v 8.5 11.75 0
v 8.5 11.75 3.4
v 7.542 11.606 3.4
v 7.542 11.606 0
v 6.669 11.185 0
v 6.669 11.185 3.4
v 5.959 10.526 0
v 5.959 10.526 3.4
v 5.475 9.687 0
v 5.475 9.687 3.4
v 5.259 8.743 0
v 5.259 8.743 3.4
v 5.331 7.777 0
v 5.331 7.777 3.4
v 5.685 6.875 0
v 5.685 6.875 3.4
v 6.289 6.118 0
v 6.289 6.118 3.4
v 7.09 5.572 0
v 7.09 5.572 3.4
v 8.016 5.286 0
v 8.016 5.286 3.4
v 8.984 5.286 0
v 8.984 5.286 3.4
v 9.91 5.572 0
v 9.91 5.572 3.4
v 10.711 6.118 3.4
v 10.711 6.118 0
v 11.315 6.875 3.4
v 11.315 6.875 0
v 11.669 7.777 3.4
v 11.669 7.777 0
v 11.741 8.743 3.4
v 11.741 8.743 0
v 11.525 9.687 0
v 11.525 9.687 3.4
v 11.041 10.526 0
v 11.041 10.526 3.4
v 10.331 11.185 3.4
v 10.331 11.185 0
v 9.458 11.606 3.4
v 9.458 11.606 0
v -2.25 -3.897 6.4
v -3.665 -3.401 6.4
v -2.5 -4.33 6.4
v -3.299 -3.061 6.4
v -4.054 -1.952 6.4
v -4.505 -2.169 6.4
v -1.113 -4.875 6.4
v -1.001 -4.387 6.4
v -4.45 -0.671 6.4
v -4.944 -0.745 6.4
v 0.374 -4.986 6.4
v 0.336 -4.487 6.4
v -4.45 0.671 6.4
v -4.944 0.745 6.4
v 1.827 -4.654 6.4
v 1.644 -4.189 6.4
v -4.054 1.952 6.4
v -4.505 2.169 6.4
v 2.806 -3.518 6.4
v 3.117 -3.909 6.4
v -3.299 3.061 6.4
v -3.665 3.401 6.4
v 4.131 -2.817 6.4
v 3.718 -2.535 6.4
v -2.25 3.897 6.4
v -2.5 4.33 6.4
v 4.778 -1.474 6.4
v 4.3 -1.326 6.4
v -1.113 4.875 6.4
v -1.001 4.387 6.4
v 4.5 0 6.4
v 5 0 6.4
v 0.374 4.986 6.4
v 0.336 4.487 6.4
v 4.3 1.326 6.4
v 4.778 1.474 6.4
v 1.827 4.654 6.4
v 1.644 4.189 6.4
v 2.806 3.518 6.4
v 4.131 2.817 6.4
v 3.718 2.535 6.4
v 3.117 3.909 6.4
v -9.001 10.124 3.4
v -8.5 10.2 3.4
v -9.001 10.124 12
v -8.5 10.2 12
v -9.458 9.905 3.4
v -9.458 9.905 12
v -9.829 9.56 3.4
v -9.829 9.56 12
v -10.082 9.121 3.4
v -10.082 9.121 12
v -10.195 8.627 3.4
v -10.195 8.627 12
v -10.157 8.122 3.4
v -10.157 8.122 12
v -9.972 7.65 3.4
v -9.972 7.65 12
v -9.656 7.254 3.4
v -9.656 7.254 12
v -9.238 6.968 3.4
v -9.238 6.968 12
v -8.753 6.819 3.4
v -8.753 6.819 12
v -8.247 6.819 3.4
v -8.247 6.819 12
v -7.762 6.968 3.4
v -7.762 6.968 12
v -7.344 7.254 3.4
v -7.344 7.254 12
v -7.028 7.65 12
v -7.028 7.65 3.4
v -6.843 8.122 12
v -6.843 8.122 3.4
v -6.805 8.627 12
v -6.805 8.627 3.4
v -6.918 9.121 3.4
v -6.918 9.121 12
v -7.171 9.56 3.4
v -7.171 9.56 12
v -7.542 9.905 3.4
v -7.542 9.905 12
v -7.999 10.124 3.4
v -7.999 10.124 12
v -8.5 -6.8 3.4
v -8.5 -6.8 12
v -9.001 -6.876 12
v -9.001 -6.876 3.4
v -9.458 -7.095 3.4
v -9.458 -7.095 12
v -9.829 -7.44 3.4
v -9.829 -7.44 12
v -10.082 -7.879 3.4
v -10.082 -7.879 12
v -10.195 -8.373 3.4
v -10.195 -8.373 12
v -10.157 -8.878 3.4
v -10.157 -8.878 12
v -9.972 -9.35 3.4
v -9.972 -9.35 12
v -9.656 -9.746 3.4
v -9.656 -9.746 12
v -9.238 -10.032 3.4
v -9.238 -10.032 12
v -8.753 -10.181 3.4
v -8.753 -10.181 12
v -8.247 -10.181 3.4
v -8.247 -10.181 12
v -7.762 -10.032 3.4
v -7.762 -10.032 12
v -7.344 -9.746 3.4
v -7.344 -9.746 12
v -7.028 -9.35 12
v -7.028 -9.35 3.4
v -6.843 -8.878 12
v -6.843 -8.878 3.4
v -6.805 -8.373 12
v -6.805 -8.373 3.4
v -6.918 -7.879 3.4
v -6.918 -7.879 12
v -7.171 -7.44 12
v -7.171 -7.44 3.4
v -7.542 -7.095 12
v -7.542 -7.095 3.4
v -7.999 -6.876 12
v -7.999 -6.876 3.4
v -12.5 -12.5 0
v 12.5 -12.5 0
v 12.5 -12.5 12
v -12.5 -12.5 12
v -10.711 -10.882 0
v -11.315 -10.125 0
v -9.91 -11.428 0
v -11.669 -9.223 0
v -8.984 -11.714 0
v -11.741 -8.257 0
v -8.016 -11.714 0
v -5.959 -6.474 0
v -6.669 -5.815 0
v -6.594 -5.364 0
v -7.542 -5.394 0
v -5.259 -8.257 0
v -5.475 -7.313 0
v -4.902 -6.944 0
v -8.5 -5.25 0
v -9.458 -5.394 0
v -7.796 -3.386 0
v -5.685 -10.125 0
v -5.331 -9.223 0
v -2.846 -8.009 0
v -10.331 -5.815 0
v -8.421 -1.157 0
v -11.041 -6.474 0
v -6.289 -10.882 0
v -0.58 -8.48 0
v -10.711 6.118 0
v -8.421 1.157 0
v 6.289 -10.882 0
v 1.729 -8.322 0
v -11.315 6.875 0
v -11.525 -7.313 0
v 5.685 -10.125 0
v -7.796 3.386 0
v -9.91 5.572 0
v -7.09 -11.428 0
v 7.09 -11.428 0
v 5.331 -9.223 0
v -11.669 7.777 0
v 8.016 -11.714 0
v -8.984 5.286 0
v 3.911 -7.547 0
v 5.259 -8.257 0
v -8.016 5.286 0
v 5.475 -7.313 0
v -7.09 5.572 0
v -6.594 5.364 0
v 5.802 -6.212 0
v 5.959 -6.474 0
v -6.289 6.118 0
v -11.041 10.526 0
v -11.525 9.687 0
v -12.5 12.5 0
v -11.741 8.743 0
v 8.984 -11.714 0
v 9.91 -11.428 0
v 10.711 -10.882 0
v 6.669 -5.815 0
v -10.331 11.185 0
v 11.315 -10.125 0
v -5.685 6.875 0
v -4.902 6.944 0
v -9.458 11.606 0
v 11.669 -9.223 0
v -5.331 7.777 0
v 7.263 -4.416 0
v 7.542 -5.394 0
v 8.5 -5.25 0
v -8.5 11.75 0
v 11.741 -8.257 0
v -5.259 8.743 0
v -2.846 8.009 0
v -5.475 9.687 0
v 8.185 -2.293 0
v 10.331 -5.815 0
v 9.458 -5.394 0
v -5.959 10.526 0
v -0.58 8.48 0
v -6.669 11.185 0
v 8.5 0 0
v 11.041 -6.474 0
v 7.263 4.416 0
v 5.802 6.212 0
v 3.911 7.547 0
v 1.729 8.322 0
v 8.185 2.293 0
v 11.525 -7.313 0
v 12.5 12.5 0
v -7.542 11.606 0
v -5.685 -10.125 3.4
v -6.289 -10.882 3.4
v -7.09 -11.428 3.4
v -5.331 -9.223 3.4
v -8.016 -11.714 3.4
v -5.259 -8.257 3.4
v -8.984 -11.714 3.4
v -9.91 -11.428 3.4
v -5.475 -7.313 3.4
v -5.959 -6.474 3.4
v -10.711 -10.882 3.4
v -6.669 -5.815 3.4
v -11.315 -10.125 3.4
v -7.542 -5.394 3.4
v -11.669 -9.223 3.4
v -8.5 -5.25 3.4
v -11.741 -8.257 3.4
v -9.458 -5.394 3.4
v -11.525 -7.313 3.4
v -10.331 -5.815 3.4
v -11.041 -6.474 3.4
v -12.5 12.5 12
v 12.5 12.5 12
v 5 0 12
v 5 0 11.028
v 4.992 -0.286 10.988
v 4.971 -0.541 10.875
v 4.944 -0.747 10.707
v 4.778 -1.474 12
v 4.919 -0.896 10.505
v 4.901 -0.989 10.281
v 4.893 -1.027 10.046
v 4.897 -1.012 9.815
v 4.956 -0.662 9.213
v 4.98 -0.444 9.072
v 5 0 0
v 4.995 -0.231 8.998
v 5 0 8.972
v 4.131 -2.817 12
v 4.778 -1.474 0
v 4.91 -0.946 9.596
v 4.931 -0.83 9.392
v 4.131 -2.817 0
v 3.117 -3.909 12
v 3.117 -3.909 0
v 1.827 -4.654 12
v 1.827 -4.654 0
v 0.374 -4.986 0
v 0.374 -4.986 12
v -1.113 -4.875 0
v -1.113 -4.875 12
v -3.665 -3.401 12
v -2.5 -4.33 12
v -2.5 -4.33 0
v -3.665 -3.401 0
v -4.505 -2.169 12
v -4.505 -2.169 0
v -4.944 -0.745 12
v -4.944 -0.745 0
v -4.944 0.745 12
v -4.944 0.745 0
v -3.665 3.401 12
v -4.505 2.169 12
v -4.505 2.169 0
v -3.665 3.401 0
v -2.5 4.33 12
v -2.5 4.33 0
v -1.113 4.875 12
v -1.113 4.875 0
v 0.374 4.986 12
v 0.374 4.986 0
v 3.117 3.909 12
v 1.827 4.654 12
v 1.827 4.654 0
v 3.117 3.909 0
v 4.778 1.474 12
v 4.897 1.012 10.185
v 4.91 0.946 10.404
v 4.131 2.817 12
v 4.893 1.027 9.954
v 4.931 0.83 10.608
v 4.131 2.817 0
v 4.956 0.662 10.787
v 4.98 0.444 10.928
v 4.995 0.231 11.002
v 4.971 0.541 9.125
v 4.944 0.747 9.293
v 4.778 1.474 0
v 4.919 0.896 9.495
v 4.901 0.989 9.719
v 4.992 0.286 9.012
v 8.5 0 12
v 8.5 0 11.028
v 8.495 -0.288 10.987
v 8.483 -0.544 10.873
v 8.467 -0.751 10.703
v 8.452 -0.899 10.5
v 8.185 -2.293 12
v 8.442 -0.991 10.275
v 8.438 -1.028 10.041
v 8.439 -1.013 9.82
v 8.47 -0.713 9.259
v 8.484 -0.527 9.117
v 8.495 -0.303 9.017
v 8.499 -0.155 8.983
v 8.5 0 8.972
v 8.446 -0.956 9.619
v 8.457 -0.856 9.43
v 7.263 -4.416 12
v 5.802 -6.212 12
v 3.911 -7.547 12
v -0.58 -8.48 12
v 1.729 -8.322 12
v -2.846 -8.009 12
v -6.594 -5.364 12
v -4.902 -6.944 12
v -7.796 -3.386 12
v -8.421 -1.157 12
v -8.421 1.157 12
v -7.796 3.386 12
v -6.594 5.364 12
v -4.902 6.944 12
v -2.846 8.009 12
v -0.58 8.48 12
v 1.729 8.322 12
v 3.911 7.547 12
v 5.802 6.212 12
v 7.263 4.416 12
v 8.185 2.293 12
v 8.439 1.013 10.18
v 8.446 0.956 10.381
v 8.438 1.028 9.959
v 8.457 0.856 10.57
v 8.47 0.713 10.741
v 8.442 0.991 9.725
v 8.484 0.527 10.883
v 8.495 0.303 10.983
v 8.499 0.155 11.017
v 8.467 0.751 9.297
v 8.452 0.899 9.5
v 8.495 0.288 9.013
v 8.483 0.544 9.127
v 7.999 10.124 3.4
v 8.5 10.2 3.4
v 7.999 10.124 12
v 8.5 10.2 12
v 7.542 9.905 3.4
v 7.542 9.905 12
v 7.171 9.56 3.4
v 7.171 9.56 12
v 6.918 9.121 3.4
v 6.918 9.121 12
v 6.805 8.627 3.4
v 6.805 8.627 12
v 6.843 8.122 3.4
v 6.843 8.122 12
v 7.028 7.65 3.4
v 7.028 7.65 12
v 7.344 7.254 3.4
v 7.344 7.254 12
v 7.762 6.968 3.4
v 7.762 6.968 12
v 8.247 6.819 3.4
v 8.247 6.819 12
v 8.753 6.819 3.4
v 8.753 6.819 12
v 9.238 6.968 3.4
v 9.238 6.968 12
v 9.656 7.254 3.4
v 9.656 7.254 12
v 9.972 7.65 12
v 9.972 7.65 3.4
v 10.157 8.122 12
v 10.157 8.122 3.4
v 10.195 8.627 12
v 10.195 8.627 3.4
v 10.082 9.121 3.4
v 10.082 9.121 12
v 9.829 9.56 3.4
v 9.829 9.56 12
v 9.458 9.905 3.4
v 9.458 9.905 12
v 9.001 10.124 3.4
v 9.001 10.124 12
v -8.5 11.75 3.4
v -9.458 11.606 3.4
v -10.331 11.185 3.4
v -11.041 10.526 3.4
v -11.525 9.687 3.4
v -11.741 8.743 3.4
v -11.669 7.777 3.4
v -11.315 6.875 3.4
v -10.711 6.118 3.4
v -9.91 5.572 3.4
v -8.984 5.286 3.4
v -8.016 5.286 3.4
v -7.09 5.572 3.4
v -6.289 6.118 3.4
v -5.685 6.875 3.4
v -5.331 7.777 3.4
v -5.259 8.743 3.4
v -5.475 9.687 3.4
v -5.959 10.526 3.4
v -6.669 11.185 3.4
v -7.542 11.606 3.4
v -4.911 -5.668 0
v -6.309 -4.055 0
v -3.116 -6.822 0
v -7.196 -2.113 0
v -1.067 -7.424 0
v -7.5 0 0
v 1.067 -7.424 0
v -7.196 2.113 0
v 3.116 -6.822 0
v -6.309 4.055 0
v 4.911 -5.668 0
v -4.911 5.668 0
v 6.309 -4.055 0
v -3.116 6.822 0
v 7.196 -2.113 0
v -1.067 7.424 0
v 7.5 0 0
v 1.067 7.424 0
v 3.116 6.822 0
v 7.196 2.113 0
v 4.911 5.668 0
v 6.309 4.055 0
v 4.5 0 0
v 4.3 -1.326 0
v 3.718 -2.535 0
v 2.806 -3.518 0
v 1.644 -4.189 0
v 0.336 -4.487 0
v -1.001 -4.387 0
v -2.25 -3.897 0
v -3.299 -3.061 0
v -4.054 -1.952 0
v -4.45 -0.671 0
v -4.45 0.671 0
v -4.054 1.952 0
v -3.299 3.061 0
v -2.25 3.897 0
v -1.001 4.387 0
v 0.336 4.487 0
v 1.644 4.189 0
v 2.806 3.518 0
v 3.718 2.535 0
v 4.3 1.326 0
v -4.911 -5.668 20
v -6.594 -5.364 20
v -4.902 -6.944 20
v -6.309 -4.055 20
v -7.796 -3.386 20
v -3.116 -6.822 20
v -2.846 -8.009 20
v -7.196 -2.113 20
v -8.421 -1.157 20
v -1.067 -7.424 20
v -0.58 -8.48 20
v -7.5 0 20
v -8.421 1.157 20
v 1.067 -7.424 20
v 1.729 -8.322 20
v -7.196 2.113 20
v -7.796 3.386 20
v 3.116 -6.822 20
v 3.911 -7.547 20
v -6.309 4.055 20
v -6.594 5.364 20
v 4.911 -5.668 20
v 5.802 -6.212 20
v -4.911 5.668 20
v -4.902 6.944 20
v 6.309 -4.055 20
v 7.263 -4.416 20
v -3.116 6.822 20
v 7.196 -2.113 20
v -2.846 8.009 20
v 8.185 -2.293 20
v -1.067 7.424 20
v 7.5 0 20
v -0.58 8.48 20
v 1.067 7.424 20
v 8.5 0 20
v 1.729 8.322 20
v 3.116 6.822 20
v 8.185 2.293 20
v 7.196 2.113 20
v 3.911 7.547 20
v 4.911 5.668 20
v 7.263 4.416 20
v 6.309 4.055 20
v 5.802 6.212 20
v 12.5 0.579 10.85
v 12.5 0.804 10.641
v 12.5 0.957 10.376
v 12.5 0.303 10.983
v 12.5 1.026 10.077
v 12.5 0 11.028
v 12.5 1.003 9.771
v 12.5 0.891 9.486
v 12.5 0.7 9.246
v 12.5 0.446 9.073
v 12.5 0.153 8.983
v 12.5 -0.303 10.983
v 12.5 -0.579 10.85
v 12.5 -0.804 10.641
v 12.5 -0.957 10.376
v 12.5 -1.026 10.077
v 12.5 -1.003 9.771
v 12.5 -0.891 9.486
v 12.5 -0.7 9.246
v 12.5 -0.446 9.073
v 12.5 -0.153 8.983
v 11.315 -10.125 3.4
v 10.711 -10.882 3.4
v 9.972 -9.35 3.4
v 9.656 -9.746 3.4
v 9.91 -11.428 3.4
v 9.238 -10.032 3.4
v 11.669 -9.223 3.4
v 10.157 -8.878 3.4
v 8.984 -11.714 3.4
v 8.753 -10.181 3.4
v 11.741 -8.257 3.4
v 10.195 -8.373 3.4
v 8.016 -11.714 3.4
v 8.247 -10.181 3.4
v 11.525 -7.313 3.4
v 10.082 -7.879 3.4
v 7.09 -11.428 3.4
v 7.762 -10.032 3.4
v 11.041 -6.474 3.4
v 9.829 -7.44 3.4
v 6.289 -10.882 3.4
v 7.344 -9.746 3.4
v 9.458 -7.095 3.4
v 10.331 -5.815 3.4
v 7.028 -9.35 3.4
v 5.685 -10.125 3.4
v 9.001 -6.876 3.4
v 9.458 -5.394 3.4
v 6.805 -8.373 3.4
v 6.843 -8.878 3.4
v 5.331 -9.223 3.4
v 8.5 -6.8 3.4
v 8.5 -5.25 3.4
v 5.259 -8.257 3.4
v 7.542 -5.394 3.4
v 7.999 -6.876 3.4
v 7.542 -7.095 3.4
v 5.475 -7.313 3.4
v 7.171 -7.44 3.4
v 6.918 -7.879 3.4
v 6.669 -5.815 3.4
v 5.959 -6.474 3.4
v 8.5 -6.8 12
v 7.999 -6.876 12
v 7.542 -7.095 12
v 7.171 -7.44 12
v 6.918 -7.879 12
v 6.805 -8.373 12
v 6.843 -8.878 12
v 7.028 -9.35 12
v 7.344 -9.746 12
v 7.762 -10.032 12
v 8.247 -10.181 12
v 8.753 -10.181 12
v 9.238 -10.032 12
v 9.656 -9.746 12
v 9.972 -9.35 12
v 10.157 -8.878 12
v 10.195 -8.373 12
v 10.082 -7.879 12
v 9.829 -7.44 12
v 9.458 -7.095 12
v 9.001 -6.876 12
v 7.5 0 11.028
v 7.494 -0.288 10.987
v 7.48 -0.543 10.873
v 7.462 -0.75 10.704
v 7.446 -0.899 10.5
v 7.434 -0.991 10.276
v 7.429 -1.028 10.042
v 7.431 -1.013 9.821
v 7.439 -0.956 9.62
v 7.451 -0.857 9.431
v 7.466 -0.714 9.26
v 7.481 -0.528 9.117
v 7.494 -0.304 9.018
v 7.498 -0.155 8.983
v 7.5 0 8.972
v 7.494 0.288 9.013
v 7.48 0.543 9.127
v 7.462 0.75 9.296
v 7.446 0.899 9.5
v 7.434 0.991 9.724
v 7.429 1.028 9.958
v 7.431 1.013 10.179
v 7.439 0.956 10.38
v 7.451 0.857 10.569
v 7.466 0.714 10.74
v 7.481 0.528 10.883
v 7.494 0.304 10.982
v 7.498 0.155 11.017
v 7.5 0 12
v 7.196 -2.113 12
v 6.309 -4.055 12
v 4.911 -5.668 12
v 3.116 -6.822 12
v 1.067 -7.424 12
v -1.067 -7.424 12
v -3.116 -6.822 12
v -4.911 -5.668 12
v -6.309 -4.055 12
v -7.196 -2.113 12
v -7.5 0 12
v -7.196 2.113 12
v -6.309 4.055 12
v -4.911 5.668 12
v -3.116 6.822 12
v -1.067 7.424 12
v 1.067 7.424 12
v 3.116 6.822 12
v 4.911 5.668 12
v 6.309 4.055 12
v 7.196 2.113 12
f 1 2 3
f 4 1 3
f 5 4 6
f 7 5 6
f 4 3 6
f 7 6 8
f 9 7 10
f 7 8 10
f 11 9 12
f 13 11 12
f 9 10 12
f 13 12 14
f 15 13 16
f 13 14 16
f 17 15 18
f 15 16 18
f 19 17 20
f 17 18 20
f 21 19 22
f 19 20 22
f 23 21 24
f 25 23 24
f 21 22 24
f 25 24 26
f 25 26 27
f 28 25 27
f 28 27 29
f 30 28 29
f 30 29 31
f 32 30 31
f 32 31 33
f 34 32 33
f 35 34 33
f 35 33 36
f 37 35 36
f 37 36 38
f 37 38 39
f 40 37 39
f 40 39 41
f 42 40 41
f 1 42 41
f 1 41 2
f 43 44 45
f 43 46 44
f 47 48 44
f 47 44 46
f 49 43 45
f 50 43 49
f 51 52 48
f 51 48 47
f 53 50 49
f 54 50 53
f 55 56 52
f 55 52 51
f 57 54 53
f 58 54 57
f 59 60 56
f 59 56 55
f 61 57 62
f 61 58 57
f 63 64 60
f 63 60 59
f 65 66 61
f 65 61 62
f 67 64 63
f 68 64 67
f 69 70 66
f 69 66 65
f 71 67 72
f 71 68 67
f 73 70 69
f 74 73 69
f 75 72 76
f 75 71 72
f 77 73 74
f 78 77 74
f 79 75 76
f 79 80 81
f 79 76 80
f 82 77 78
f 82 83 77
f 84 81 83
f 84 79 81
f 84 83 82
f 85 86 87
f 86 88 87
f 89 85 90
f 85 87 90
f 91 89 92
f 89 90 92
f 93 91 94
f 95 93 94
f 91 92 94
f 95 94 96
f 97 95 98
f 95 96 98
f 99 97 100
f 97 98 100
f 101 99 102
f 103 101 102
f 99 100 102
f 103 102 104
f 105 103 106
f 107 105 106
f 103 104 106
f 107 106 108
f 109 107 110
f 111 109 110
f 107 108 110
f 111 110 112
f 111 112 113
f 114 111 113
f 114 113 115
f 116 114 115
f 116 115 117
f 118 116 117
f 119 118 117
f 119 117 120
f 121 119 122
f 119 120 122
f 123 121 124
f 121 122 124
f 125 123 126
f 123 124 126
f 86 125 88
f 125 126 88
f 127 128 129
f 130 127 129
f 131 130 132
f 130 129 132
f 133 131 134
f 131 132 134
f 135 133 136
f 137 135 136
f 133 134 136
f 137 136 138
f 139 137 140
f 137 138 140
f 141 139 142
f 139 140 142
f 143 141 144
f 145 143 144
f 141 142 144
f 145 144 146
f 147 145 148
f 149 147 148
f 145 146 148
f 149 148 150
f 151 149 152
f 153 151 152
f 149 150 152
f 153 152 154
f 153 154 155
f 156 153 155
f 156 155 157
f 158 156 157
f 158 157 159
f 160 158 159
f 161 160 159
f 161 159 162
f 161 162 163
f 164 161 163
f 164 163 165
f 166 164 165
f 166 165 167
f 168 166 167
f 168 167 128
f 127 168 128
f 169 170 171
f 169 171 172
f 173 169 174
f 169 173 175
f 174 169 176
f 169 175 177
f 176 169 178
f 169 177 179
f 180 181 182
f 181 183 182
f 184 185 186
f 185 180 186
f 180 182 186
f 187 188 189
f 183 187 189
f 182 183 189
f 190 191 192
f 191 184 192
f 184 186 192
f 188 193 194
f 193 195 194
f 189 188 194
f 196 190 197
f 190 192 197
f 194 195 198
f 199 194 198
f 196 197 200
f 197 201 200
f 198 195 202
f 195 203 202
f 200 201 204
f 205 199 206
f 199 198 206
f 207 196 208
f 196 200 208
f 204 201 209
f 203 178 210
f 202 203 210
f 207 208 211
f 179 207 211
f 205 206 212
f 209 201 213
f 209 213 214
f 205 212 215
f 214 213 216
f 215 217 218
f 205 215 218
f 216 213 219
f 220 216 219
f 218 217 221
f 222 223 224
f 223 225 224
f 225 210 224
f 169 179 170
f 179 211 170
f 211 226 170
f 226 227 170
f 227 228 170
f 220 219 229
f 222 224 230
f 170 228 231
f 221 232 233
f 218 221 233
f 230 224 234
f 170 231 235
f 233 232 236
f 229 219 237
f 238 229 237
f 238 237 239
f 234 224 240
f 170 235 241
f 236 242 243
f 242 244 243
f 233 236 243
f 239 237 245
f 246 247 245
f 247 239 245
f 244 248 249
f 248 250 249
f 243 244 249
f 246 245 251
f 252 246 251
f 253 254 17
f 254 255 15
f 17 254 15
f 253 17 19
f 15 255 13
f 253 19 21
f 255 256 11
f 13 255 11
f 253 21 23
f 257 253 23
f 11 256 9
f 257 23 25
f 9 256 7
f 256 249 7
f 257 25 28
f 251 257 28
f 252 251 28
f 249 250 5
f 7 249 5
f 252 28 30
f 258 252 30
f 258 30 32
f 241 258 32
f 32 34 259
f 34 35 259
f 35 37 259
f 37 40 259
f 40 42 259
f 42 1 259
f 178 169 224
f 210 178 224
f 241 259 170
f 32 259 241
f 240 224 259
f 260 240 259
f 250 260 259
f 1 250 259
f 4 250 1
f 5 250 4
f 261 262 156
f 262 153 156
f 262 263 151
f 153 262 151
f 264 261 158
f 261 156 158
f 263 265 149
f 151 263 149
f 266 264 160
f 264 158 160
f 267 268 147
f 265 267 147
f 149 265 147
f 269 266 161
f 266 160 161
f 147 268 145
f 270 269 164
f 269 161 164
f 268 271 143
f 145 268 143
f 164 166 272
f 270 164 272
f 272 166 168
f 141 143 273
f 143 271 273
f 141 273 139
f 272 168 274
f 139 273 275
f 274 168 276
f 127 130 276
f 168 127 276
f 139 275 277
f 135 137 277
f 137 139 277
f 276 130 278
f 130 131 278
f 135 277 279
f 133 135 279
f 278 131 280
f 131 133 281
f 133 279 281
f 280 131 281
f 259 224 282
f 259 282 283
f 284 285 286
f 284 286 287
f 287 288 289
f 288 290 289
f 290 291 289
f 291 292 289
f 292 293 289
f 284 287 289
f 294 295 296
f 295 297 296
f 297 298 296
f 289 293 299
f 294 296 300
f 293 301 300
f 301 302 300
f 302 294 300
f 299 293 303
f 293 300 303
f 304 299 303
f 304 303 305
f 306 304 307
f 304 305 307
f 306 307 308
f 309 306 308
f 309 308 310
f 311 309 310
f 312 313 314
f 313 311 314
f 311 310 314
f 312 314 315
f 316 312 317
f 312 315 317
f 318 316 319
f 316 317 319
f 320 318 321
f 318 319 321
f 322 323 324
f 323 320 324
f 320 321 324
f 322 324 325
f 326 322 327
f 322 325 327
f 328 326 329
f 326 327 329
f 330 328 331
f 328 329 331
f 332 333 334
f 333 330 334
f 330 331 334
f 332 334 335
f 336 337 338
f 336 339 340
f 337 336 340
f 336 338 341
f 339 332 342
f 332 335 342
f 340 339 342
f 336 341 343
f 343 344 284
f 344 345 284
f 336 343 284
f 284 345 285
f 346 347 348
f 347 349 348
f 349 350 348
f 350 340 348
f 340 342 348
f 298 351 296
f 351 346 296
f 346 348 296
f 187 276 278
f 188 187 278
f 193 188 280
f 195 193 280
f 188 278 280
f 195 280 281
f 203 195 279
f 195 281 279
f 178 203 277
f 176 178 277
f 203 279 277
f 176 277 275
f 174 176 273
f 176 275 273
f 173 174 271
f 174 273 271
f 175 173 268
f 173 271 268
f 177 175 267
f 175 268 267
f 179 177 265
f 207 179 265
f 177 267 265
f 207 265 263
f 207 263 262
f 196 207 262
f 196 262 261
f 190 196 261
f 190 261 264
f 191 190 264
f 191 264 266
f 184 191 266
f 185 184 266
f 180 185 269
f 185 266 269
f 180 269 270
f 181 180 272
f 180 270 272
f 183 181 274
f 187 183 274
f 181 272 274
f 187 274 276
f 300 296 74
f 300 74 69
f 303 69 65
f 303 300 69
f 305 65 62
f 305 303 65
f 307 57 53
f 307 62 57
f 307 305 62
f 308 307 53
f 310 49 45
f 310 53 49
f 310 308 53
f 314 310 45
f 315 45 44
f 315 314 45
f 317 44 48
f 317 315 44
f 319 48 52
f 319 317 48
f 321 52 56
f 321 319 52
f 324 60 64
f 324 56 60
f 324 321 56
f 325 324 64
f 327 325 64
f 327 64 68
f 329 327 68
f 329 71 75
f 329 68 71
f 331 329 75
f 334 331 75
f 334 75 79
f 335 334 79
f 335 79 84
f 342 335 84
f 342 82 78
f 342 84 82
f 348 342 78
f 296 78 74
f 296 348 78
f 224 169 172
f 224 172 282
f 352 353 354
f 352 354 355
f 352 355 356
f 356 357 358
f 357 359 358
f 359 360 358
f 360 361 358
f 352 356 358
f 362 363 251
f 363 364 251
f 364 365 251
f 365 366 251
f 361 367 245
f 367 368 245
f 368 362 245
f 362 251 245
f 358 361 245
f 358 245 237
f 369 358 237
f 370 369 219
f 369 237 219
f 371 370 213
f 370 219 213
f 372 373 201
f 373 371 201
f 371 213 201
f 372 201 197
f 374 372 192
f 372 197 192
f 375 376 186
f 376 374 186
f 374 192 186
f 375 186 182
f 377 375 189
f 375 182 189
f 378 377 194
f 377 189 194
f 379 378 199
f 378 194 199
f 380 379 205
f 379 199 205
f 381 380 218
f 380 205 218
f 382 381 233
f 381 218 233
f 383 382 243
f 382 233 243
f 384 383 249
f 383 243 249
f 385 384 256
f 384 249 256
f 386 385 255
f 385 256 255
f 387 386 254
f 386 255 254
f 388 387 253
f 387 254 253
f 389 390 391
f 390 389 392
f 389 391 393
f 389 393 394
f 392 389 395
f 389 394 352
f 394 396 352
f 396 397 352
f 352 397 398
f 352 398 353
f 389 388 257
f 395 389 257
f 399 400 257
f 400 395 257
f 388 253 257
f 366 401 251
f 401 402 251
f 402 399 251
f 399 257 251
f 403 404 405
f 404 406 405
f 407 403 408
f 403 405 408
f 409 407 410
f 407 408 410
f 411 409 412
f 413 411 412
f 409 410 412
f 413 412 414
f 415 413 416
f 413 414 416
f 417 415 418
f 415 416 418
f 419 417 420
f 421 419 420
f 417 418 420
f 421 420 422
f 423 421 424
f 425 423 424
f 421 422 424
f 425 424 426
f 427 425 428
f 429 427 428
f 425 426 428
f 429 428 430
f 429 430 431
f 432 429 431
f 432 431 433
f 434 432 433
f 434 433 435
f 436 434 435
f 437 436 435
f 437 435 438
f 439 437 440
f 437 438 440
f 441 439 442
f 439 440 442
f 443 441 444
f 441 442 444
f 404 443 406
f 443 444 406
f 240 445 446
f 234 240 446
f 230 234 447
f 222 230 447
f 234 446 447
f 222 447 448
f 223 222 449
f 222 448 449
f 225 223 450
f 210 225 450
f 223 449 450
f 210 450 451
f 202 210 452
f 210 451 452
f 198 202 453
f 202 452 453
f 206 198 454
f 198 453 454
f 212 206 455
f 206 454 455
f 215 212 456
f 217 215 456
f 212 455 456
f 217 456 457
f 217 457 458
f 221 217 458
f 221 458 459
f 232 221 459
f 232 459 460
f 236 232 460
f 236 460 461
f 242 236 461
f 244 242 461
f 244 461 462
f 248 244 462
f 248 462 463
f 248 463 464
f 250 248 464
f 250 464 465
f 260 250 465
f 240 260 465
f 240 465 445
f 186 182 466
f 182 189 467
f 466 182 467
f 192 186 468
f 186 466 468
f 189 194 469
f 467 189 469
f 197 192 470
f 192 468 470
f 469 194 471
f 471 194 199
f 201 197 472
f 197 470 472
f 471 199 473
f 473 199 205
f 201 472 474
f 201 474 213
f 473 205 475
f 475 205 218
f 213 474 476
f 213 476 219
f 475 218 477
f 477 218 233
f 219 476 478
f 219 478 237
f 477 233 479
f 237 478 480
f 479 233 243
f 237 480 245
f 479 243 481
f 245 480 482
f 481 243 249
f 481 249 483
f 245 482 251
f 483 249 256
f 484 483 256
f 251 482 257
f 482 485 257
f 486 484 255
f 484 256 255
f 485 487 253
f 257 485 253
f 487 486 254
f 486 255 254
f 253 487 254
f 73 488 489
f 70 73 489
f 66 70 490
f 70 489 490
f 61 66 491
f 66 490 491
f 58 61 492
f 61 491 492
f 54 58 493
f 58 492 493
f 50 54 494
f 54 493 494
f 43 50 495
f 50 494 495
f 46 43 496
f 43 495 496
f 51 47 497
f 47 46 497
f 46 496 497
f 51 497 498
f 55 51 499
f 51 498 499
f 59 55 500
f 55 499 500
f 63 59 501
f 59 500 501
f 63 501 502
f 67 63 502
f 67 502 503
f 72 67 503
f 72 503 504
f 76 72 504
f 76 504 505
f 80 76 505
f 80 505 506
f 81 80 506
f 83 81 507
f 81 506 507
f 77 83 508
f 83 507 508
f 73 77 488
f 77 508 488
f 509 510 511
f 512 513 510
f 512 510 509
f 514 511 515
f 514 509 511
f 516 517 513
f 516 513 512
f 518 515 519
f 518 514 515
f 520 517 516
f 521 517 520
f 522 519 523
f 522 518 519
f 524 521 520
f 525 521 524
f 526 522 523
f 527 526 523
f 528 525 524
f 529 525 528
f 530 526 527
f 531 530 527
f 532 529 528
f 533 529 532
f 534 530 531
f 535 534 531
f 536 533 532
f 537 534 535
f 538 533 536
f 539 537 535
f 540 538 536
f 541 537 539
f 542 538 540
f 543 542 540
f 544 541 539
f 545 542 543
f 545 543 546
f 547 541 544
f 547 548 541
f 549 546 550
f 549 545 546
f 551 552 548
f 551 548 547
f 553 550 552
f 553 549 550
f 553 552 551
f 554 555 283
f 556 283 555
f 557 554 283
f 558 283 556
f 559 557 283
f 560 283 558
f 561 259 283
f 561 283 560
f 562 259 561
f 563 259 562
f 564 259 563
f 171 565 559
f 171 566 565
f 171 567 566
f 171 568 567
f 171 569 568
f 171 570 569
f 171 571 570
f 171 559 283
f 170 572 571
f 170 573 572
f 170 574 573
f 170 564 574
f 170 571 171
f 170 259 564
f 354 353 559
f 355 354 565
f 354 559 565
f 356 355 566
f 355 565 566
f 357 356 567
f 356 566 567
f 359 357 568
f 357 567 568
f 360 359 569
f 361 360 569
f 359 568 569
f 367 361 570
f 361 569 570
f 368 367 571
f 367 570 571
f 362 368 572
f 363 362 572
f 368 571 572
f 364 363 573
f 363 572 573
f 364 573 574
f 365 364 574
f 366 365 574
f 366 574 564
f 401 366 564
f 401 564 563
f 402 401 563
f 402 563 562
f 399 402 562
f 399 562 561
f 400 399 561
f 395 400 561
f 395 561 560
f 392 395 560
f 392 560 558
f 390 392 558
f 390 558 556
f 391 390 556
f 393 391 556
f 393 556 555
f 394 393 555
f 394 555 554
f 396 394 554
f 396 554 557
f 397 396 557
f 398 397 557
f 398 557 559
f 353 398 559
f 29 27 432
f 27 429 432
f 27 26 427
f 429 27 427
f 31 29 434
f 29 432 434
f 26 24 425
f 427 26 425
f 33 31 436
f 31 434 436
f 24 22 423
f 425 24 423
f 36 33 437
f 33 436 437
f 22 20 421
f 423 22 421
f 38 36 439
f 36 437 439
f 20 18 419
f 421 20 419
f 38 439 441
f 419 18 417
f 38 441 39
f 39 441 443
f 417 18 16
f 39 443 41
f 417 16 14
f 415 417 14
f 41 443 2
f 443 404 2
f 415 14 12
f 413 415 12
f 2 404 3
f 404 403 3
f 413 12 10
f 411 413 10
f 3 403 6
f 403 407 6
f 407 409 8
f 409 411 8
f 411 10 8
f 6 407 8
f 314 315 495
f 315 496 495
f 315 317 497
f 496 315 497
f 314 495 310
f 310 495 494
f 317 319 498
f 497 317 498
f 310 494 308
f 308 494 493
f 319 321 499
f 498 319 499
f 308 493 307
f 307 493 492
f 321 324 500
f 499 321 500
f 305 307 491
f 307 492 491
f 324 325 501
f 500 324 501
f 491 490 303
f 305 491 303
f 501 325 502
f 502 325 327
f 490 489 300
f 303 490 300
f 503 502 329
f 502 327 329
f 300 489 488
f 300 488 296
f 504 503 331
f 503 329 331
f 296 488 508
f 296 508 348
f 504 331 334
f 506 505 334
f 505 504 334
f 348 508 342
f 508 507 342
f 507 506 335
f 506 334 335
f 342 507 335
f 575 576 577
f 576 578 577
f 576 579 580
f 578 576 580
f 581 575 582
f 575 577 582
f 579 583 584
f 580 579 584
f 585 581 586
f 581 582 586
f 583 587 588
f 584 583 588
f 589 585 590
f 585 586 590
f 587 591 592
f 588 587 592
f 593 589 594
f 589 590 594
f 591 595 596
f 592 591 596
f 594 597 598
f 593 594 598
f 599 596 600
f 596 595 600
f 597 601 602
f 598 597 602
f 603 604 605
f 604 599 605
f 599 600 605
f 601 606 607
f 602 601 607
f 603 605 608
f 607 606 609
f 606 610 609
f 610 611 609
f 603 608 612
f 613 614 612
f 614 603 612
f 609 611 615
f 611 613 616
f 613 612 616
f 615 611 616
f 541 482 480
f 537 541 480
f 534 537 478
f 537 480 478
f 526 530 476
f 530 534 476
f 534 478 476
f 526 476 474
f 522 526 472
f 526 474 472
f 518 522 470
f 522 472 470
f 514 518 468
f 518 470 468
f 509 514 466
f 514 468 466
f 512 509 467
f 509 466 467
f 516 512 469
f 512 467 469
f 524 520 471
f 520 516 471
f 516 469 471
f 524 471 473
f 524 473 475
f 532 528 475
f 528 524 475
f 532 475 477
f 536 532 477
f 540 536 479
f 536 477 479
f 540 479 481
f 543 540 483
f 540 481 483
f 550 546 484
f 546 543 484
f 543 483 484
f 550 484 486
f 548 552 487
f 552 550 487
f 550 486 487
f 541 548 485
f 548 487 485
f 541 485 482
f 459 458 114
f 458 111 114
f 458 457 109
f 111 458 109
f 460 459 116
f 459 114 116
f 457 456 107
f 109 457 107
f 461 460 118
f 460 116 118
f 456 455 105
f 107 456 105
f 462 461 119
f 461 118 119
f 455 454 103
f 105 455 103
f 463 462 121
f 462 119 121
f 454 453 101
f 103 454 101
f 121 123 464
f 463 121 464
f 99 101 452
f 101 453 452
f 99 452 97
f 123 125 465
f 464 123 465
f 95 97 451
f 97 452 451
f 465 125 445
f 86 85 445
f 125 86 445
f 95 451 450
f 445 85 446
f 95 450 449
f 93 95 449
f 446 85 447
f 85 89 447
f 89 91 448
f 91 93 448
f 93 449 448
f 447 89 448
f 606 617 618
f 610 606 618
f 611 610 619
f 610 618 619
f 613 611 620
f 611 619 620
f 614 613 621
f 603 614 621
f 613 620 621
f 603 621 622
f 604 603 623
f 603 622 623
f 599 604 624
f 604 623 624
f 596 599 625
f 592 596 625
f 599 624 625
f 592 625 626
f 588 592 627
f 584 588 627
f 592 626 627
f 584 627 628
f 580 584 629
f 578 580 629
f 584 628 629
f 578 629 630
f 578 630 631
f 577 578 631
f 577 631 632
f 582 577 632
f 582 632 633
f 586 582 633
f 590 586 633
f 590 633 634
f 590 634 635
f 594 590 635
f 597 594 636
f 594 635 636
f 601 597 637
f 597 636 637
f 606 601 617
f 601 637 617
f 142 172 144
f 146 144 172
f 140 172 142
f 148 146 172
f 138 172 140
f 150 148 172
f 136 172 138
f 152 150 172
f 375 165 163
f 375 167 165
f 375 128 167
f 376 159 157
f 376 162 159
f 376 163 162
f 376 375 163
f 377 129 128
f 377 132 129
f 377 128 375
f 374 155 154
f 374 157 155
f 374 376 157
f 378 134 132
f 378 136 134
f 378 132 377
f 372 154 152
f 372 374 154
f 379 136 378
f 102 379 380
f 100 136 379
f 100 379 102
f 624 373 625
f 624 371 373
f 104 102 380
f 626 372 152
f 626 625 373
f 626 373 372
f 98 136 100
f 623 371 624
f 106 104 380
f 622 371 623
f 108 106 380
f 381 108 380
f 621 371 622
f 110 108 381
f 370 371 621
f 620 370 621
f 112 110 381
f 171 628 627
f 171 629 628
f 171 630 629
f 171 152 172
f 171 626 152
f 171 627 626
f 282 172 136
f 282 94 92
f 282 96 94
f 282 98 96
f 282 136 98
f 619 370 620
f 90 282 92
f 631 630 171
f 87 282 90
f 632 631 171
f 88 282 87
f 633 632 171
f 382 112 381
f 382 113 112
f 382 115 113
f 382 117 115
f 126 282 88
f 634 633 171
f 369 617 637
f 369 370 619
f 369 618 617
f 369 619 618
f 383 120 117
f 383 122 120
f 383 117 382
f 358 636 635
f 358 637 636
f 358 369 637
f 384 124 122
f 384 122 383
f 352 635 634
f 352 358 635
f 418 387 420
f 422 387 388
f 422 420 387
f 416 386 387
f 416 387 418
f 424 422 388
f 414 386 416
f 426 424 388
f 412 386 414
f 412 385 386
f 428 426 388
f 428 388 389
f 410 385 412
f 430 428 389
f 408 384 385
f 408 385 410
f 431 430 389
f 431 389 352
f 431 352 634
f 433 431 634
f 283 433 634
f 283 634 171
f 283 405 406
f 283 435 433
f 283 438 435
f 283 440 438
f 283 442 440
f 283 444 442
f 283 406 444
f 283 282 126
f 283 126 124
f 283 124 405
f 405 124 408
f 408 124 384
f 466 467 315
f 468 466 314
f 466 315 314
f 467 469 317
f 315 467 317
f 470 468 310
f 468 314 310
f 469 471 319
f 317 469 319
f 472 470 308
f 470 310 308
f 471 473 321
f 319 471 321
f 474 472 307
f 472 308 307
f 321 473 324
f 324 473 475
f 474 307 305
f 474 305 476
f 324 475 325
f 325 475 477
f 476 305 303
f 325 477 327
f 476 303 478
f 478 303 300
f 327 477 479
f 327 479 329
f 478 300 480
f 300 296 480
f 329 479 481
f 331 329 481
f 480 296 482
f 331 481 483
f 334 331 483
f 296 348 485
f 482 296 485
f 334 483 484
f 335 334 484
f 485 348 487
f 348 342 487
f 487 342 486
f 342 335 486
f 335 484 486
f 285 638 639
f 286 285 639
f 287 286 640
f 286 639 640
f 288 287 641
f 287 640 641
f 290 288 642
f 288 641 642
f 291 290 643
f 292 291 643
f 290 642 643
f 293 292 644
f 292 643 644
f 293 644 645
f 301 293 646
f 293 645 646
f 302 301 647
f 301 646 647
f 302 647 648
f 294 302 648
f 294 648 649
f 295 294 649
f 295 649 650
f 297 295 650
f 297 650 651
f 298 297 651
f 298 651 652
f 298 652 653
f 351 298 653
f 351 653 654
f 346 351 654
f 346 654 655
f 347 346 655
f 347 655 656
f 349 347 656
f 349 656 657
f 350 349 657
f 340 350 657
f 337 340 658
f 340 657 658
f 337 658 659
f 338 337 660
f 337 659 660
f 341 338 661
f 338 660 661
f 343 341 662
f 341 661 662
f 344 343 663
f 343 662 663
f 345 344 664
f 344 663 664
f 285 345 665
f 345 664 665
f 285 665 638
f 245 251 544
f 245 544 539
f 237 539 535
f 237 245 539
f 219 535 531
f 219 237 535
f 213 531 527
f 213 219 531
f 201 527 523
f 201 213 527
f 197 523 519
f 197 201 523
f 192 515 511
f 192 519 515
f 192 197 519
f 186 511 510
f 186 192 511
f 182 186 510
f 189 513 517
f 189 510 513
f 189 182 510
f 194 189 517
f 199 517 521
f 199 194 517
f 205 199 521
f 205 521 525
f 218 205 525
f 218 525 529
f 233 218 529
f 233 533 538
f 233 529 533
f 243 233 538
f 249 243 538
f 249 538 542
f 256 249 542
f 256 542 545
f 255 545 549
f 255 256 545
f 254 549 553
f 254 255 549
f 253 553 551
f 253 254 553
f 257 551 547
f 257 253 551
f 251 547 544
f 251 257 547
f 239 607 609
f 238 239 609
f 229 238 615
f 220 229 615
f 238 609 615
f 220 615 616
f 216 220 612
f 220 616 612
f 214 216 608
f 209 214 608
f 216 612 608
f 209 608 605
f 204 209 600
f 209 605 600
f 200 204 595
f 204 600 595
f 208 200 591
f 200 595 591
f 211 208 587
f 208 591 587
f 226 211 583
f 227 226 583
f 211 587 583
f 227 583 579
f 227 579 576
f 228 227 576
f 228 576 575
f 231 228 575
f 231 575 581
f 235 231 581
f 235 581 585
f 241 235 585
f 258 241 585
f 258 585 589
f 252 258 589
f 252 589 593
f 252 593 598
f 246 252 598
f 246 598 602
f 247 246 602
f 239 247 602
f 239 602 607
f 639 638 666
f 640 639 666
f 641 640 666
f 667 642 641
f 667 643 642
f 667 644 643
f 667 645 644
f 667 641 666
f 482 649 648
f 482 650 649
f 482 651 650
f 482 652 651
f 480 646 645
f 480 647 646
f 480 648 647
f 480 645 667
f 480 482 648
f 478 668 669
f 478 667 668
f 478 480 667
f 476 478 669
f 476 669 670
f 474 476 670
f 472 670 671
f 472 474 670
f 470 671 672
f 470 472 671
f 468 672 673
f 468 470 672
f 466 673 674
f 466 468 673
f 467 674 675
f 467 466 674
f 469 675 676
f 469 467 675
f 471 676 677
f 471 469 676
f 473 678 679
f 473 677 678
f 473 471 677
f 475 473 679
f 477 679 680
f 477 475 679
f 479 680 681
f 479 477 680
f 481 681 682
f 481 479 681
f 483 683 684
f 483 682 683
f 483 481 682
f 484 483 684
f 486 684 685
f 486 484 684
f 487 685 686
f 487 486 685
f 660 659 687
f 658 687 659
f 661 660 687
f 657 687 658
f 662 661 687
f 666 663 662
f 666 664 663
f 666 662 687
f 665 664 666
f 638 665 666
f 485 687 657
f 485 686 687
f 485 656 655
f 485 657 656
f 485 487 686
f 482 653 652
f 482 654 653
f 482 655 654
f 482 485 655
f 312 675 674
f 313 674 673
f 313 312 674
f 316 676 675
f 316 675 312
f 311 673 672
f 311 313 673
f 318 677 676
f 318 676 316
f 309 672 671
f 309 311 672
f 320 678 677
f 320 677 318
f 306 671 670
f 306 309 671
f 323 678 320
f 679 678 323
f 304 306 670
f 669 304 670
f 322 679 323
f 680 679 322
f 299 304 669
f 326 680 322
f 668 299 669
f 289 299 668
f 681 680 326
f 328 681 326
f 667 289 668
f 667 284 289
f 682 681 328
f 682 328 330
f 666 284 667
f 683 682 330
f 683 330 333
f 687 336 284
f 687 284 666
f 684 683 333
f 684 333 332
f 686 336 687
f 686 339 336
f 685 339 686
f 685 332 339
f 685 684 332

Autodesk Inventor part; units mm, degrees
ref_plane "YZ Plane" through (0, 0, 0) normal (1, 0, 0) x (0, 1, 0)
ref_plane "XZ Plane" through (0, 0, 0) normal (0, 1, 0) x (-1, 0, 0)
ref_plane "XY Plane" through (0, 0, 0) normal (0, 0, 1) x (1, 0, 0)
sketch "Skizze1" plane through (0, 0, 0) normal (0, 0, 1) x (1, 0, 0)
  line L0 (12.5, -12.5) -> (-12.5, -12.5)
  line L1 (-12.5, -12.5) -> (-12.5, 12.5)
  line L2 (-12.5, 12.5) -> (12.5, 12.5)
  line L3 (12.5, 12.5) -> (12.5, -12.5)
  circle A0 centre (0, 0) radius 5
  circle A1 centre (0, 0) radius 7.5
  circle A2 centre (0, 0) radius 8.5
  circle A3 centre (0, 0) radius 4.5
  point P0 (-8.5, 8.5)
  point P1 (8.5, 8.5)
  point P2 (8.5, -8.5)
  point P3 (-8.5, -8.5)
  dimension "d0" = 25
  dimension "d1" = 25
  dimension "d2" = 4
  dimension "d3" = 4
  dimension "d4" = 4
  dimension "d5" = 4
  dimension "d6" = 10
  dimension "d7" = 15
  dimension "d8" = 17
  dimension "d11" = 9
  dimension "d18" = 12.5
  dimension "d19" = 12.5
  dimension "d21" = 4
  dimension "d38" = 4
  dimension "d39" = 4
  dimension "d48" = 4
sketch "Skizze2" plane through (0, 0, 0) normal (1, 0, 0) x (0, 1, 0)
  line L0 (0, 0) -> (0, 10)
  dimension "d47" = 10
extrude "Extrusion2" add sketch "Skizze1" along normal blind 20 contours A2
extrude "Extrusion3" add sketch "Skizze1" along normal blind 12 separate body contours L0 L1 L2 L3 | A1
extrude "Extrusion4" add sketch "Skizze1" along normal blind 6.4 separate body contours A0
hole "Bohrung2" at (8.5, -8.5, 0) at (8.5, 8.5, 0) at (-8.5, 8.5, 0) at (-8.5, -8.5, 0) direction (0, 0, 1) diameter 3.4 end through all counterbore diameter 6.5 counterbore depth 3.4 bodies 2 clearance for "Inbusschraube DIN EN ISO 4762" size "M3" standard "DIN"
hole "Bohrung3" at (0, 0, 10) direction (1, 0, 0) diameter 2.057 end through all bodies 2
properties part number "Oberteil_Zerstäuber"
